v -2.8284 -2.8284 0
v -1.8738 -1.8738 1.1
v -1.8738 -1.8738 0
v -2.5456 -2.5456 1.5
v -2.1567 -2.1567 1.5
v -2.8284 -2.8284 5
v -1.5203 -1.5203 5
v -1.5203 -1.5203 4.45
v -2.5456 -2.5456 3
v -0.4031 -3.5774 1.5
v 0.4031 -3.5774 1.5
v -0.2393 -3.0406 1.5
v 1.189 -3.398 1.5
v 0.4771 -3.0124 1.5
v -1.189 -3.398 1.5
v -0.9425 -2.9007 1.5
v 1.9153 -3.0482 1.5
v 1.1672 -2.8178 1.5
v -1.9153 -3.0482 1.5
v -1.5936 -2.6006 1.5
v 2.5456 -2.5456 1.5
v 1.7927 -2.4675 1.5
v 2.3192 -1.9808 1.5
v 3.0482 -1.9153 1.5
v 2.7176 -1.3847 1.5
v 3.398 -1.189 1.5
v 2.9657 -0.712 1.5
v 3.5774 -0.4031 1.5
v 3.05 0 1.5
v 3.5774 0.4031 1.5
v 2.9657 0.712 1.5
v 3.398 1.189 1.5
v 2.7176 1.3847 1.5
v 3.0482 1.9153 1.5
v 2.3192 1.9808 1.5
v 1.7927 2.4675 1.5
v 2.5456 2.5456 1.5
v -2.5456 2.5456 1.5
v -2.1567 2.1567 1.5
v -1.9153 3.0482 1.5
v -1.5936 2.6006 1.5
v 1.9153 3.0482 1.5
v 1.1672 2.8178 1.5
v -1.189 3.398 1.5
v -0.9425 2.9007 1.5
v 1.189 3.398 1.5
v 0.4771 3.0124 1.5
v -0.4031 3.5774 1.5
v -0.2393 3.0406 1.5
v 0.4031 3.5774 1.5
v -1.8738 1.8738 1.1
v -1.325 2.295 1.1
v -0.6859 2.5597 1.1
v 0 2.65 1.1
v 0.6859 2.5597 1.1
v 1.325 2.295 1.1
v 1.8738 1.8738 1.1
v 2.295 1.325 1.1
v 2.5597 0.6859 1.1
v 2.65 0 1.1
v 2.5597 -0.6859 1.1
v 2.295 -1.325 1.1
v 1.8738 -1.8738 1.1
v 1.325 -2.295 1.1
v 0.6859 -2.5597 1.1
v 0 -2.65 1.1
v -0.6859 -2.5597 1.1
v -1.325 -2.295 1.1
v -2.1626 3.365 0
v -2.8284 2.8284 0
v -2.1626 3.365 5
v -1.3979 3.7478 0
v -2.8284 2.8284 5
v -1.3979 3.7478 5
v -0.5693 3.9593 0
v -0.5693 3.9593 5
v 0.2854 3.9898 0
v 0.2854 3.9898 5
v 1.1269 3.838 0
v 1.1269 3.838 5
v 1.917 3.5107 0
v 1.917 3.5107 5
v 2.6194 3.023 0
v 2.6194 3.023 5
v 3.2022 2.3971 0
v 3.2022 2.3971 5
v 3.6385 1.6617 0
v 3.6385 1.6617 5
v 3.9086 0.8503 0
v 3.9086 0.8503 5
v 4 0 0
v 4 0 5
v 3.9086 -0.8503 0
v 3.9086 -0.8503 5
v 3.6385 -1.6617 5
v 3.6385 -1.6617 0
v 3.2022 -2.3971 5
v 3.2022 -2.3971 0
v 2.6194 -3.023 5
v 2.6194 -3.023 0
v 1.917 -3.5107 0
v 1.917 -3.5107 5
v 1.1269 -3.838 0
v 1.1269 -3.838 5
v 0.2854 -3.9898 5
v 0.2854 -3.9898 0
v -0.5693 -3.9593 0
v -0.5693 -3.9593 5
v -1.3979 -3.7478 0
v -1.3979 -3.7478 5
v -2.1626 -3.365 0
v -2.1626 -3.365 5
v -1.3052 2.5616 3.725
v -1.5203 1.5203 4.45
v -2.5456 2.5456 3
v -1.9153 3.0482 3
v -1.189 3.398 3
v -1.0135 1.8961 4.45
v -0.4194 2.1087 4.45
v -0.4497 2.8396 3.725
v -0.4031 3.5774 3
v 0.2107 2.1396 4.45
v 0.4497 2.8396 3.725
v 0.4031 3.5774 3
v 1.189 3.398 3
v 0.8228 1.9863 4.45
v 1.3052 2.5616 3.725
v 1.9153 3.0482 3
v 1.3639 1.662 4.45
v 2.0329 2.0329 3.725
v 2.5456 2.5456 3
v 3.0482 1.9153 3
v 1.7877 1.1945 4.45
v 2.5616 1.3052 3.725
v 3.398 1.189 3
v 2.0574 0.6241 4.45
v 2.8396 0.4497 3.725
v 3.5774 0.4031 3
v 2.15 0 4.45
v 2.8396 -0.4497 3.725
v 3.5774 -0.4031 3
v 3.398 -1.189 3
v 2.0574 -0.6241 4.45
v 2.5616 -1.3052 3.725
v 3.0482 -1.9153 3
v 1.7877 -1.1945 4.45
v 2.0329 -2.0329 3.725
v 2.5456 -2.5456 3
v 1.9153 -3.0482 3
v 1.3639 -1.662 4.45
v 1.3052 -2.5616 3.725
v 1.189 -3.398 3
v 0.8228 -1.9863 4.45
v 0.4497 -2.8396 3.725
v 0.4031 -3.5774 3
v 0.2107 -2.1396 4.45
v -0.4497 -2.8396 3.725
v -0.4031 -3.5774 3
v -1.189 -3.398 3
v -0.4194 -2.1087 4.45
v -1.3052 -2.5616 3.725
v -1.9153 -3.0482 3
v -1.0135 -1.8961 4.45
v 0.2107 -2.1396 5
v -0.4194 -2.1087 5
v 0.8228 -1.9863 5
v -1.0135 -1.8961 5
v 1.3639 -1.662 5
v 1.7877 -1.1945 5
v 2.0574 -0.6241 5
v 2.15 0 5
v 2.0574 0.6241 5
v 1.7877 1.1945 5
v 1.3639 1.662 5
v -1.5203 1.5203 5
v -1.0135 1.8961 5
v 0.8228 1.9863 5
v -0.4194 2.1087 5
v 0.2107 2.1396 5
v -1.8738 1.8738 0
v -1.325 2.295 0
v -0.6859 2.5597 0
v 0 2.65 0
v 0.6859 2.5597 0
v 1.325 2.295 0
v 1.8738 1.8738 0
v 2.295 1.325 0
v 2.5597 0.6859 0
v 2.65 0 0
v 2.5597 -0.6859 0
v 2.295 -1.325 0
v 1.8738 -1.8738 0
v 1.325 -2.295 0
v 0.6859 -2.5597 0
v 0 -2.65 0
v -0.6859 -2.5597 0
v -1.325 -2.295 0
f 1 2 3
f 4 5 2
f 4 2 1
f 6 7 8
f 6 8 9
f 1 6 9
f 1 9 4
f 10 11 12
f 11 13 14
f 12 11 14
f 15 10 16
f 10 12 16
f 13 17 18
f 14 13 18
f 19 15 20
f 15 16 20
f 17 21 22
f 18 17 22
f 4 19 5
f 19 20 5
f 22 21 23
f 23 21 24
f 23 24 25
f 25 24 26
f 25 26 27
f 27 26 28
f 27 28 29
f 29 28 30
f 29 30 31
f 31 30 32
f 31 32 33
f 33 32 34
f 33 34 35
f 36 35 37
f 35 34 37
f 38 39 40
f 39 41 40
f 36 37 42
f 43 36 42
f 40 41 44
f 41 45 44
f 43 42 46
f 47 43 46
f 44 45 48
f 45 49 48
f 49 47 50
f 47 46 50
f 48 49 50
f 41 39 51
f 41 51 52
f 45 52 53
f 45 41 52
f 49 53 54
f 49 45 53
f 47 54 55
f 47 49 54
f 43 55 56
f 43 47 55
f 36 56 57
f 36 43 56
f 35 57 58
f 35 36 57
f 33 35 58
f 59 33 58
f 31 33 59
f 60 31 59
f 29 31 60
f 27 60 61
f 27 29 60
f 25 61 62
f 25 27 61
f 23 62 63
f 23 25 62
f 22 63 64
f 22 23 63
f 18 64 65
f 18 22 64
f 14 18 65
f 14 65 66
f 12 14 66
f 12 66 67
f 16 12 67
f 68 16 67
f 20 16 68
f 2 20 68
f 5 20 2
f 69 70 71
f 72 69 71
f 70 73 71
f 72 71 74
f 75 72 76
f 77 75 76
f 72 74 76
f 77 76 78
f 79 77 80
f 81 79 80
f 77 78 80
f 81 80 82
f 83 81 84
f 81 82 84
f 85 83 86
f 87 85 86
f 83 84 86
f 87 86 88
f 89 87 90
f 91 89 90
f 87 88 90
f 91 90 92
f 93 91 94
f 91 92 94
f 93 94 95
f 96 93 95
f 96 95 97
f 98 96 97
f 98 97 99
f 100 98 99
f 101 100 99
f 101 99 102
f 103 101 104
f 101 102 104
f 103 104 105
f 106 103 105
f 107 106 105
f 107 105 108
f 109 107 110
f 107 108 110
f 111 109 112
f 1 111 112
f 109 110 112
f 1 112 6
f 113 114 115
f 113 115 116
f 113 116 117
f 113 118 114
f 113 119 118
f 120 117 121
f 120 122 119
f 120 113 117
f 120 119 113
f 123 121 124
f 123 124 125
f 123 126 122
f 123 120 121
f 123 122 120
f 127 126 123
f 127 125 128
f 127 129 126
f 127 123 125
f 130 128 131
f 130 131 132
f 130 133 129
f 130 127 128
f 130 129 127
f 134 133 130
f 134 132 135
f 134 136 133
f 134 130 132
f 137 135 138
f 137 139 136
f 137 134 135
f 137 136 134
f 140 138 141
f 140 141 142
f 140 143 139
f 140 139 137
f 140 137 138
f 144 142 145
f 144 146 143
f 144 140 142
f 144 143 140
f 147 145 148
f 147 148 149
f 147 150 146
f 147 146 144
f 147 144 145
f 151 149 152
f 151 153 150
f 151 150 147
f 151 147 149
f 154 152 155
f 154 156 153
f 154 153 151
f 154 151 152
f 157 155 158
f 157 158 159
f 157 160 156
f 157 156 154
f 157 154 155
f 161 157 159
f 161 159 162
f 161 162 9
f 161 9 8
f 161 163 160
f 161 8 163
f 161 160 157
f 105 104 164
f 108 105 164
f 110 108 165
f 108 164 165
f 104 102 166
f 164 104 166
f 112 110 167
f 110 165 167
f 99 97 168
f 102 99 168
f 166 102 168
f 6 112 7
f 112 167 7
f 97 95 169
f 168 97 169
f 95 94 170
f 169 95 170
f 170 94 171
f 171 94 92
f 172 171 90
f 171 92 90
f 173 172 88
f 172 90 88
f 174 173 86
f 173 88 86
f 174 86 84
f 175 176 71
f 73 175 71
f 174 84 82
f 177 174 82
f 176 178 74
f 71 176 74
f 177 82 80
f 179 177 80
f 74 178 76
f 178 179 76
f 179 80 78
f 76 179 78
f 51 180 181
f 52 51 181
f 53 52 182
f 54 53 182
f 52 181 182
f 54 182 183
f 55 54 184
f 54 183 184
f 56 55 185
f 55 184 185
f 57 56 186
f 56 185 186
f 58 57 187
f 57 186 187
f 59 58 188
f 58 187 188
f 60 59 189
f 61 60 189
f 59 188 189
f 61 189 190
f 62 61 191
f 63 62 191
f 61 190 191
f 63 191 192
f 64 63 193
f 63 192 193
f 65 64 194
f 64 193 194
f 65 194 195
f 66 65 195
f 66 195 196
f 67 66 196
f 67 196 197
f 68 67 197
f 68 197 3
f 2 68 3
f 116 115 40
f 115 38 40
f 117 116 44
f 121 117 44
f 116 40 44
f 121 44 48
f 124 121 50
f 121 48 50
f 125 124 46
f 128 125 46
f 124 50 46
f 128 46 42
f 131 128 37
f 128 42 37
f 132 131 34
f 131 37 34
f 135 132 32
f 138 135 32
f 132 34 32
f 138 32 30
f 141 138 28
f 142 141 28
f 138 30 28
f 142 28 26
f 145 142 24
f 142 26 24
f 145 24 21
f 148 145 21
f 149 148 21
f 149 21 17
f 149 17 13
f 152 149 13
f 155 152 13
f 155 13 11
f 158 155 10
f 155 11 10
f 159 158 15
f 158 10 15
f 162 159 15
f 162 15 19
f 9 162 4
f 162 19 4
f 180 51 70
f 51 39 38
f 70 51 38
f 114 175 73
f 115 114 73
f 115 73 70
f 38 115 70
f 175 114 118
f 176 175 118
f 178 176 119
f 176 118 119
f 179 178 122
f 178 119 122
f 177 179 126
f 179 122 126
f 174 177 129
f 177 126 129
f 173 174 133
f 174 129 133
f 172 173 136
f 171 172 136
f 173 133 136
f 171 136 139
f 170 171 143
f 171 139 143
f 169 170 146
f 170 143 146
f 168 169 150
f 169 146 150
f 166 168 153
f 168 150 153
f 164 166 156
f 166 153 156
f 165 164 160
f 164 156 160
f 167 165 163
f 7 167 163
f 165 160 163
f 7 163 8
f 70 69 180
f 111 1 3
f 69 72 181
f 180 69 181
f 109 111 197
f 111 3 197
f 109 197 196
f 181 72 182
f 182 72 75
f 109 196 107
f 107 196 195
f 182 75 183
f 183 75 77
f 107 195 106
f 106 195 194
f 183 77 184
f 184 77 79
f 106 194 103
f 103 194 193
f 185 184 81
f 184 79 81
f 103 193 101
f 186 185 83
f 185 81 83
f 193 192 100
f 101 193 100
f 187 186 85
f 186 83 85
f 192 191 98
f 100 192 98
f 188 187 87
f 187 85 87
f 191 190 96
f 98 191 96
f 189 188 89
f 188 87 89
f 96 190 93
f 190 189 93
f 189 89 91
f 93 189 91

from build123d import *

# Parameters (mm, degrees)
F1_ANGLE_BACK = 135
F1_ANGLE      = 270
F2_SIZE       = 0.4
F3_SIZE       = 1.44999


# Not quite as in the source:
# - a fillet or chamfer is up to 0.001 mm smaller than in the source, because OpenCascade refuses the exact size


with BuildPart() as f1:
    # F0 (on Front) → F1 (revolve)
    with BuildSketch(Plane.XZ, mode=Mode.PRIVATE) as f1_sk:
        Polygon((2.65, 1.5), (2.65, 0), (4, 0), (4, 5), (2.15, 5), (2.15, 3), (3.6, 3), (3.6, 1.5), align=None)
    revolve(f1_sk.sketch.rotate(Axis((0, 0, 2.5), (0, 0, -1)), -F1_ANGLE_BACK), axis=Axis((0, 0, 2.5), (0, 0, -1)), revolution_arc=F1_ANGLE)

    # F2
    f2_edges = [f1.edges().sort_by_distance(p)[0] for p in [
        (2.65, 0, 1.5),
    ]]
    chamfer(f2_edges, length=F2_SIZE)

    # F3 (size 1.45 in the source; OpenCascade refuses exactly that, so slightly less here)
    f3_edges = [f1.edges().sort_by_distance(p)[0] for p in [
        (2.15, 0, 3),
    ]]
    chamfer(f3_edges, length=F3_SIZE)


solid = f1.part
